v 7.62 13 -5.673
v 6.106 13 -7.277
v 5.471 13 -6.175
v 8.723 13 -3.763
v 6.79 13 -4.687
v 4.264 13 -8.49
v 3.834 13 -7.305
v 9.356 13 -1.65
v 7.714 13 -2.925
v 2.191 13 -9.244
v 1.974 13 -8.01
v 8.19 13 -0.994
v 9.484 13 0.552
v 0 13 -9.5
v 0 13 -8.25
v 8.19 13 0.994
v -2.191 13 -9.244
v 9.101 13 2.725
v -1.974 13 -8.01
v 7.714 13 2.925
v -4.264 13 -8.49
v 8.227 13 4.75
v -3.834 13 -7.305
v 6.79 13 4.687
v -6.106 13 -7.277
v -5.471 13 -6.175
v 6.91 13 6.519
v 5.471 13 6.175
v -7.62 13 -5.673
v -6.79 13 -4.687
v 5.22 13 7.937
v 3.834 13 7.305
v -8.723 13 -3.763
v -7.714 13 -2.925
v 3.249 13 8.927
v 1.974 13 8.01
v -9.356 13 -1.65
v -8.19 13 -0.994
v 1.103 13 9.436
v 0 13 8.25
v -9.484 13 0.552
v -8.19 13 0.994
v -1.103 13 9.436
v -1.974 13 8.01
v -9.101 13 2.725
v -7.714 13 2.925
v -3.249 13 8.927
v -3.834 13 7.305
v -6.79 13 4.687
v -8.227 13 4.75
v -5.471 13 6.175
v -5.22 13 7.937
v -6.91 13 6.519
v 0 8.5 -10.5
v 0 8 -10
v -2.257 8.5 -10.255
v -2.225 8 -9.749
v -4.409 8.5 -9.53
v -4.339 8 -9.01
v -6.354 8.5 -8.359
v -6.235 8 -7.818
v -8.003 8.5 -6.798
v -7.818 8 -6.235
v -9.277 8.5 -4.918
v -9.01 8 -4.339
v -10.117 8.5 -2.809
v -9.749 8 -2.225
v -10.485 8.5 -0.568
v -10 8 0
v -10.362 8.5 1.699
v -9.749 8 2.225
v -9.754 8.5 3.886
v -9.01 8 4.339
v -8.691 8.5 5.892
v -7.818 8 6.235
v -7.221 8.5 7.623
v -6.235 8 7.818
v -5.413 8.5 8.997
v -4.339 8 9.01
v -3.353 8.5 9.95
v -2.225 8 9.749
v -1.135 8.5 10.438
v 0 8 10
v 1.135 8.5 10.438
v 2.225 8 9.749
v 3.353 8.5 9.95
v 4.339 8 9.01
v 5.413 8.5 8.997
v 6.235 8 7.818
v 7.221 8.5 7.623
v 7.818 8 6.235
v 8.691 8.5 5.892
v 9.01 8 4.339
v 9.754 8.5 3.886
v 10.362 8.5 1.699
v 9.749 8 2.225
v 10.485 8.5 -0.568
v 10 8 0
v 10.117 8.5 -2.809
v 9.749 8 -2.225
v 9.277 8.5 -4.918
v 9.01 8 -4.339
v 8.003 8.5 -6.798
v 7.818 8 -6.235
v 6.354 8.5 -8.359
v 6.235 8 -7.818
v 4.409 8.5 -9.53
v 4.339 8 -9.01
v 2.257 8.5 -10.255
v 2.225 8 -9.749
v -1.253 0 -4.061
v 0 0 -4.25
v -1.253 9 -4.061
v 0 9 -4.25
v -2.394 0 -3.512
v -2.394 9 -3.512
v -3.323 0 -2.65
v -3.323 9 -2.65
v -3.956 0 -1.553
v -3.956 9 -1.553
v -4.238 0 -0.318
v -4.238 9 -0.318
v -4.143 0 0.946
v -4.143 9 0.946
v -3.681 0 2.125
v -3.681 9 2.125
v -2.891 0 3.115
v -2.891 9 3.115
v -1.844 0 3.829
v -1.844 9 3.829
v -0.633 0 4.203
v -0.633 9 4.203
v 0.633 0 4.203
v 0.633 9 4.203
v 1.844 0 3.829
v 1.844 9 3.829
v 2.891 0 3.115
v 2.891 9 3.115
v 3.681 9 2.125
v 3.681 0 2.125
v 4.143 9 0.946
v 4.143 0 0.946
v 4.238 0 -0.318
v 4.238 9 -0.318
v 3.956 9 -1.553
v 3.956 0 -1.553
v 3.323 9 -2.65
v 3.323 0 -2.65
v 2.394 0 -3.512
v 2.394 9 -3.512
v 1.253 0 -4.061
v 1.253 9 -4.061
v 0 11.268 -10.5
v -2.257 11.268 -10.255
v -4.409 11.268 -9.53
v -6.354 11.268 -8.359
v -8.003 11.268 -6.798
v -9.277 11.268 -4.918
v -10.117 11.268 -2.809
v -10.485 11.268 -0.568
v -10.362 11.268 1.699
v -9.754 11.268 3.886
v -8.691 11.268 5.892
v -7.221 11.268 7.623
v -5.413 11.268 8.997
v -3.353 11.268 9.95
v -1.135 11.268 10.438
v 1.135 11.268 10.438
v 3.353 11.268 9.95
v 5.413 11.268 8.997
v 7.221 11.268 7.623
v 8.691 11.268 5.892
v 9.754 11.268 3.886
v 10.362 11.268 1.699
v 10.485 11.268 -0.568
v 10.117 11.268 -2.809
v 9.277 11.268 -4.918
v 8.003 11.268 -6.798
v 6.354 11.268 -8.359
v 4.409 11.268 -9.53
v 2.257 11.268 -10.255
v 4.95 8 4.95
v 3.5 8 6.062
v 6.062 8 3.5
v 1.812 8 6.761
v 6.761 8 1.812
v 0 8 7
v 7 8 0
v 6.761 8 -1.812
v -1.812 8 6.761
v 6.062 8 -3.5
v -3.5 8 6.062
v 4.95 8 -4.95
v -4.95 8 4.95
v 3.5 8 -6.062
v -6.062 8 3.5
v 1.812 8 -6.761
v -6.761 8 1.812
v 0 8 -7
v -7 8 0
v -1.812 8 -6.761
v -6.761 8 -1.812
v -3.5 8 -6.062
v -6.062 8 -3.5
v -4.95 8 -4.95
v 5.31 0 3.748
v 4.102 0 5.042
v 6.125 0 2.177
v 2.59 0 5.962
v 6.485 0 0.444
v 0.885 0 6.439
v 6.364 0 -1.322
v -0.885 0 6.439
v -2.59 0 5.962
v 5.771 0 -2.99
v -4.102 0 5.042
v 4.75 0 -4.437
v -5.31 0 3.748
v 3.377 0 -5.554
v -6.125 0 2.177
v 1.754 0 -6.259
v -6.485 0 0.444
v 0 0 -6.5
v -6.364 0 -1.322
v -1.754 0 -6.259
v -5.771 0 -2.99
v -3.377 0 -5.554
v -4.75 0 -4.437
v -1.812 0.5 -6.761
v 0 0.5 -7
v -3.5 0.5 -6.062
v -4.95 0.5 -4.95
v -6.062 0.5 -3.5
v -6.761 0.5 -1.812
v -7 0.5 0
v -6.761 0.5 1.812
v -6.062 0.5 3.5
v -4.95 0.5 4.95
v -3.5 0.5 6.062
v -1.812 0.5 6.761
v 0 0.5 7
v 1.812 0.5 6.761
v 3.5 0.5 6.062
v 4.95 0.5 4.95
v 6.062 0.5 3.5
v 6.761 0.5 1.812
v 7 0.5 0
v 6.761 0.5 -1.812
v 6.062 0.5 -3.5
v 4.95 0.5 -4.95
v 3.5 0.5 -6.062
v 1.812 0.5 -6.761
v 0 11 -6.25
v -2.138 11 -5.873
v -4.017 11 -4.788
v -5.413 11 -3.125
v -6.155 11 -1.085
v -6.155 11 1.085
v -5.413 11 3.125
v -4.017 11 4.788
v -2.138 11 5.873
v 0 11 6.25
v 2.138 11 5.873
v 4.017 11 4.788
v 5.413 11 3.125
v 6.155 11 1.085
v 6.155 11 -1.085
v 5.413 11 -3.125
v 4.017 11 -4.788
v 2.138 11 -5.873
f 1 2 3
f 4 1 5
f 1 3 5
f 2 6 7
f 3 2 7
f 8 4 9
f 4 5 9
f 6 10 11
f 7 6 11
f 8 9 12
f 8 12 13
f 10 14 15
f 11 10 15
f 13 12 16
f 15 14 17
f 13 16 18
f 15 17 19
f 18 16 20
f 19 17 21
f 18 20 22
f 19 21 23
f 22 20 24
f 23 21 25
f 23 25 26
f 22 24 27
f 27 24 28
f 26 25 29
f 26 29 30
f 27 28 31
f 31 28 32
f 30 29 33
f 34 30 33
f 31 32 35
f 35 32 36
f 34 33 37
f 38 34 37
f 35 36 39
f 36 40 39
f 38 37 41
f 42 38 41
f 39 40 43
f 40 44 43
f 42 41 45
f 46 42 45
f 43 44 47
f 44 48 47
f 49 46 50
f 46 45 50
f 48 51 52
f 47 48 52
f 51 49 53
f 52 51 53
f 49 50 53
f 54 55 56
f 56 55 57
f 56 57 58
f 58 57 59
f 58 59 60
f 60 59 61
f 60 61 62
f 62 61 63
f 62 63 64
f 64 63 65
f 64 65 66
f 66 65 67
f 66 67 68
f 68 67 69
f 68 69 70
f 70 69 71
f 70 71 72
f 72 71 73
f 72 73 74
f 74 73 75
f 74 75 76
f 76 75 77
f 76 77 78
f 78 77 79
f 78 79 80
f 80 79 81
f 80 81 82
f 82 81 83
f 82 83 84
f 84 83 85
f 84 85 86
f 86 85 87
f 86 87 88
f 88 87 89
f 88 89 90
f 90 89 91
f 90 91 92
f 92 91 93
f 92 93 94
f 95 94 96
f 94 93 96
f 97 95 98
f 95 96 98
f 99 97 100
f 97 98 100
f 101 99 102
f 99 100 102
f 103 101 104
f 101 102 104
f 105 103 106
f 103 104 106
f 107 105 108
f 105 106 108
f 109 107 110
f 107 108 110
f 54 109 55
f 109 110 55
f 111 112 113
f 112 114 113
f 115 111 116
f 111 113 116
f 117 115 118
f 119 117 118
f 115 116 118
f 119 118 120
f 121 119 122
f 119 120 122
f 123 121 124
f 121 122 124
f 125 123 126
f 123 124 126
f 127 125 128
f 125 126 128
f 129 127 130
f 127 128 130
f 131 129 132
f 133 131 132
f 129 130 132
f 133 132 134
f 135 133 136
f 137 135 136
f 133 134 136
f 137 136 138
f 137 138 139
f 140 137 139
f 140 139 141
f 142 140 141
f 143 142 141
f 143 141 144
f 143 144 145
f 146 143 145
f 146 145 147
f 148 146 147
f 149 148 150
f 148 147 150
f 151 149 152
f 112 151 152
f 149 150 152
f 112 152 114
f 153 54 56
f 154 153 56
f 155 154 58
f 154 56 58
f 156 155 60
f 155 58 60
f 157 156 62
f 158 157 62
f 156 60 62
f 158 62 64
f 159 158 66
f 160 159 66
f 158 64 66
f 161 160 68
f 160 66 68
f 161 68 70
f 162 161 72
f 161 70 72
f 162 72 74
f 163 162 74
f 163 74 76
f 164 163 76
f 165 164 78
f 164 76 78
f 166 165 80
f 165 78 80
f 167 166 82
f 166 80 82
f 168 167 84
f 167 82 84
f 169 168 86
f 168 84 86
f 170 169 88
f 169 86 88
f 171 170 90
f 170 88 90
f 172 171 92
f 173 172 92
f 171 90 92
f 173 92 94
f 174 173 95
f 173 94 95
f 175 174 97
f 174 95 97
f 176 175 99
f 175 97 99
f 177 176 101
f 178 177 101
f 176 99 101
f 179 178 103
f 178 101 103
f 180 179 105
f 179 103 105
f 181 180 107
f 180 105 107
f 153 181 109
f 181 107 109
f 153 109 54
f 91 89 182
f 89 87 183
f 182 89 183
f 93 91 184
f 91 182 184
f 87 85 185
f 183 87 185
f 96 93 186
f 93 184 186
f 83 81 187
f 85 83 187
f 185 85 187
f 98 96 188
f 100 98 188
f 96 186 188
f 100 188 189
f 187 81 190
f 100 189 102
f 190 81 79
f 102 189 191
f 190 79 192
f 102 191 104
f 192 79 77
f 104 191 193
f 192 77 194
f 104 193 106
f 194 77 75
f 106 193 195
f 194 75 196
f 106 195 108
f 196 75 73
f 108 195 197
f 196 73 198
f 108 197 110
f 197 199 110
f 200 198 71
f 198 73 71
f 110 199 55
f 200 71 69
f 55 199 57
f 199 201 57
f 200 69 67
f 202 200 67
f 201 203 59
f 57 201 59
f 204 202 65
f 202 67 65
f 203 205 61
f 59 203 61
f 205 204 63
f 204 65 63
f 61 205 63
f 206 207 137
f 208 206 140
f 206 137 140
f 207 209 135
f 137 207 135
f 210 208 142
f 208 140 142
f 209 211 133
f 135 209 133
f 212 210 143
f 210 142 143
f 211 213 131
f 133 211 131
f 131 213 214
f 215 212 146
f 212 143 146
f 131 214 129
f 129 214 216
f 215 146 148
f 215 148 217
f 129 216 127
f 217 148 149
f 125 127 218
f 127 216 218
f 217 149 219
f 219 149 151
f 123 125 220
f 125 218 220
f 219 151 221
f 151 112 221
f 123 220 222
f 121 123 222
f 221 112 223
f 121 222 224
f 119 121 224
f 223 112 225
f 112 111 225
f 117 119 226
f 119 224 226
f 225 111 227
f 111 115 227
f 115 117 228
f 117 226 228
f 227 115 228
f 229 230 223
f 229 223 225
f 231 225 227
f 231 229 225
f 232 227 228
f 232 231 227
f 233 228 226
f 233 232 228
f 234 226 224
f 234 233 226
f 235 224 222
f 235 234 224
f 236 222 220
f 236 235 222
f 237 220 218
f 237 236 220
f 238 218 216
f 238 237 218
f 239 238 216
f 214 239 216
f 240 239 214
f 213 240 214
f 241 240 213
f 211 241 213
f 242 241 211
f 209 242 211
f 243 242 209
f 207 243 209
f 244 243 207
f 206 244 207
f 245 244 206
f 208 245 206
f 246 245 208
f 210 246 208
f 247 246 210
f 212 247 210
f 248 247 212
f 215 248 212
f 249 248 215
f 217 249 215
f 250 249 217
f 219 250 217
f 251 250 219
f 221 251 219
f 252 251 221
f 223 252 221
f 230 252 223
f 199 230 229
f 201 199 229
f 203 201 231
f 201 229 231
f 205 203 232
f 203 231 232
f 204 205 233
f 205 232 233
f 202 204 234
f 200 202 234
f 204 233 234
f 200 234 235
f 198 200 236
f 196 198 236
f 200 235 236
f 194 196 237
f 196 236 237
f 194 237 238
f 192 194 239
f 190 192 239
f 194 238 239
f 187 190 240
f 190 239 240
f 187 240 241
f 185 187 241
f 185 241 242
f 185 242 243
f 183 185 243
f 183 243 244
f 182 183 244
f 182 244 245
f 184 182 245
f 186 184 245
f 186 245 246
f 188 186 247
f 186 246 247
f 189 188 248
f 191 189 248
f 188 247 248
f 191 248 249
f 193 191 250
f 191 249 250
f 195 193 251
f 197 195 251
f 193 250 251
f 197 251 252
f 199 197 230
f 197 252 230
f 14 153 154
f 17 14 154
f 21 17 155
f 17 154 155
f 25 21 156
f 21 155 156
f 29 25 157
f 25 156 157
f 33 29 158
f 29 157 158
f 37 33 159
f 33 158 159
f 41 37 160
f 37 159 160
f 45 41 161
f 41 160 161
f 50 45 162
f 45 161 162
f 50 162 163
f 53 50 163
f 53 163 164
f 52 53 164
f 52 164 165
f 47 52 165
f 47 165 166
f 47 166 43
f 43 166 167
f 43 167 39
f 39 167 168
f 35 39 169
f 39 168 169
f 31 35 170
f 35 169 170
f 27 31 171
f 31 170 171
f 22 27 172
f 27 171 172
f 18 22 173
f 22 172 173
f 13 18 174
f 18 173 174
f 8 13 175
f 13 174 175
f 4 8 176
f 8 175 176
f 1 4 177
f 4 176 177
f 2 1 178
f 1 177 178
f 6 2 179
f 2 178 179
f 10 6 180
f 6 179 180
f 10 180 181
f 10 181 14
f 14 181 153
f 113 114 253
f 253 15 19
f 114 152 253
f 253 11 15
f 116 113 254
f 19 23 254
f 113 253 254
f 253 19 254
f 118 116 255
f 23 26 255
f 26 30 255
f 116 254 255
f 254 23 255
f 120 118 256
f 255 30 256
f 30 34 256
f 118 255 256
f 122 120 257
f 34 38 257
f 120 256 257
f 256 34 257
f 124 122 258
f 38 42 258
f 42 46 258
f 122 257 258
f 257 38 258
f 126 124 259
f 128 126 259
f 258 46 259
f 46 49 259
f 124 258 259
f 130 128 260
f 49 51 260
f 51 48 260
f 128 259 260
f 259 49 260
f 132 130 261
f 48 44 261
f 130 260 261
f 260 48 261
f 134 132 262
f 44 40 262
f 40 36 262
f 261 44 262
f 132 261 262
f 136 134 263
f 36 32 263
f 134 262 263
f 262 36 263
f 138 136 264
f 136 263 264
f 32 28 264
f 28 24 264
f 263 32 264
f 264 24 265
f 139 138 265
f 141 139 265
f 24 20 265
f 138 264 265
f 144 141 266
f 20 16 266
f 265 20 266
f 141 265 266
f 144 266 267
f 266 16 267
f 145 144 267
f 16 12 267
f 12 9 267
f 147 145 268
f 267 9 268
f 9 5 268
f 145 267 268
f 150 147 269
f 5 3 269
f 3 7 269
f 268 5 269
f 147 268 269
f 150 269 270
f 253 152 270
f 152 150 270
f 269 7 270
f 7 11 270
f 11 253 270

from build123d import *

# Parameters (mm, degrees)
CHAMFER1_SIZE  = 1
CHAMFER1_SIZE2 = 1.732050808
CHAMFER2_SIZE  = 0.5


with BuildPart() as part:
    # Sketch1 → Revolve1 (revolve)
    with BuildSketch(Plane.XY, mode=Mode.PRIVATE) as revolve1_sk:
        Polygon((4.25, 0), (4.25, 9), (8.25, 13), (10.5, 13), (10.5, 8), (7, 8), (7, 0), align=None)
    revolve(revolve1_sk.sketch.rotate(Axis((0, 0, 0), (0, 1, 0)), 90), axis=Axis((0, 0, 0), (0, 1, 0)))

    # Chamfer1
    chamfer1_edges = [part.edges().sort_by_distance(p)[0] for p in [
        (0, 13, 10.5),
    ]]
    chamfer1_side = [part.faces().sort_by_distance(p)[0] for p in [
        (0, 13, 8.546984848),
    ]]
    chamfer(chamfer1_edges, length=CHAMFER1_SIZE, length2=CHAMFER1_SIZE2, reference=chamfer1_side[0])

    # Chamfer2
    chamfer2_edges = [part.edges().sort_by_distance(p)[0] for p in [
        (0, 0, 7),
        (0, 8, 10.5),
    ]]
    chamfer(chamfer2_edges, length=CHAMFER2_SIZE)


solid = part.part
